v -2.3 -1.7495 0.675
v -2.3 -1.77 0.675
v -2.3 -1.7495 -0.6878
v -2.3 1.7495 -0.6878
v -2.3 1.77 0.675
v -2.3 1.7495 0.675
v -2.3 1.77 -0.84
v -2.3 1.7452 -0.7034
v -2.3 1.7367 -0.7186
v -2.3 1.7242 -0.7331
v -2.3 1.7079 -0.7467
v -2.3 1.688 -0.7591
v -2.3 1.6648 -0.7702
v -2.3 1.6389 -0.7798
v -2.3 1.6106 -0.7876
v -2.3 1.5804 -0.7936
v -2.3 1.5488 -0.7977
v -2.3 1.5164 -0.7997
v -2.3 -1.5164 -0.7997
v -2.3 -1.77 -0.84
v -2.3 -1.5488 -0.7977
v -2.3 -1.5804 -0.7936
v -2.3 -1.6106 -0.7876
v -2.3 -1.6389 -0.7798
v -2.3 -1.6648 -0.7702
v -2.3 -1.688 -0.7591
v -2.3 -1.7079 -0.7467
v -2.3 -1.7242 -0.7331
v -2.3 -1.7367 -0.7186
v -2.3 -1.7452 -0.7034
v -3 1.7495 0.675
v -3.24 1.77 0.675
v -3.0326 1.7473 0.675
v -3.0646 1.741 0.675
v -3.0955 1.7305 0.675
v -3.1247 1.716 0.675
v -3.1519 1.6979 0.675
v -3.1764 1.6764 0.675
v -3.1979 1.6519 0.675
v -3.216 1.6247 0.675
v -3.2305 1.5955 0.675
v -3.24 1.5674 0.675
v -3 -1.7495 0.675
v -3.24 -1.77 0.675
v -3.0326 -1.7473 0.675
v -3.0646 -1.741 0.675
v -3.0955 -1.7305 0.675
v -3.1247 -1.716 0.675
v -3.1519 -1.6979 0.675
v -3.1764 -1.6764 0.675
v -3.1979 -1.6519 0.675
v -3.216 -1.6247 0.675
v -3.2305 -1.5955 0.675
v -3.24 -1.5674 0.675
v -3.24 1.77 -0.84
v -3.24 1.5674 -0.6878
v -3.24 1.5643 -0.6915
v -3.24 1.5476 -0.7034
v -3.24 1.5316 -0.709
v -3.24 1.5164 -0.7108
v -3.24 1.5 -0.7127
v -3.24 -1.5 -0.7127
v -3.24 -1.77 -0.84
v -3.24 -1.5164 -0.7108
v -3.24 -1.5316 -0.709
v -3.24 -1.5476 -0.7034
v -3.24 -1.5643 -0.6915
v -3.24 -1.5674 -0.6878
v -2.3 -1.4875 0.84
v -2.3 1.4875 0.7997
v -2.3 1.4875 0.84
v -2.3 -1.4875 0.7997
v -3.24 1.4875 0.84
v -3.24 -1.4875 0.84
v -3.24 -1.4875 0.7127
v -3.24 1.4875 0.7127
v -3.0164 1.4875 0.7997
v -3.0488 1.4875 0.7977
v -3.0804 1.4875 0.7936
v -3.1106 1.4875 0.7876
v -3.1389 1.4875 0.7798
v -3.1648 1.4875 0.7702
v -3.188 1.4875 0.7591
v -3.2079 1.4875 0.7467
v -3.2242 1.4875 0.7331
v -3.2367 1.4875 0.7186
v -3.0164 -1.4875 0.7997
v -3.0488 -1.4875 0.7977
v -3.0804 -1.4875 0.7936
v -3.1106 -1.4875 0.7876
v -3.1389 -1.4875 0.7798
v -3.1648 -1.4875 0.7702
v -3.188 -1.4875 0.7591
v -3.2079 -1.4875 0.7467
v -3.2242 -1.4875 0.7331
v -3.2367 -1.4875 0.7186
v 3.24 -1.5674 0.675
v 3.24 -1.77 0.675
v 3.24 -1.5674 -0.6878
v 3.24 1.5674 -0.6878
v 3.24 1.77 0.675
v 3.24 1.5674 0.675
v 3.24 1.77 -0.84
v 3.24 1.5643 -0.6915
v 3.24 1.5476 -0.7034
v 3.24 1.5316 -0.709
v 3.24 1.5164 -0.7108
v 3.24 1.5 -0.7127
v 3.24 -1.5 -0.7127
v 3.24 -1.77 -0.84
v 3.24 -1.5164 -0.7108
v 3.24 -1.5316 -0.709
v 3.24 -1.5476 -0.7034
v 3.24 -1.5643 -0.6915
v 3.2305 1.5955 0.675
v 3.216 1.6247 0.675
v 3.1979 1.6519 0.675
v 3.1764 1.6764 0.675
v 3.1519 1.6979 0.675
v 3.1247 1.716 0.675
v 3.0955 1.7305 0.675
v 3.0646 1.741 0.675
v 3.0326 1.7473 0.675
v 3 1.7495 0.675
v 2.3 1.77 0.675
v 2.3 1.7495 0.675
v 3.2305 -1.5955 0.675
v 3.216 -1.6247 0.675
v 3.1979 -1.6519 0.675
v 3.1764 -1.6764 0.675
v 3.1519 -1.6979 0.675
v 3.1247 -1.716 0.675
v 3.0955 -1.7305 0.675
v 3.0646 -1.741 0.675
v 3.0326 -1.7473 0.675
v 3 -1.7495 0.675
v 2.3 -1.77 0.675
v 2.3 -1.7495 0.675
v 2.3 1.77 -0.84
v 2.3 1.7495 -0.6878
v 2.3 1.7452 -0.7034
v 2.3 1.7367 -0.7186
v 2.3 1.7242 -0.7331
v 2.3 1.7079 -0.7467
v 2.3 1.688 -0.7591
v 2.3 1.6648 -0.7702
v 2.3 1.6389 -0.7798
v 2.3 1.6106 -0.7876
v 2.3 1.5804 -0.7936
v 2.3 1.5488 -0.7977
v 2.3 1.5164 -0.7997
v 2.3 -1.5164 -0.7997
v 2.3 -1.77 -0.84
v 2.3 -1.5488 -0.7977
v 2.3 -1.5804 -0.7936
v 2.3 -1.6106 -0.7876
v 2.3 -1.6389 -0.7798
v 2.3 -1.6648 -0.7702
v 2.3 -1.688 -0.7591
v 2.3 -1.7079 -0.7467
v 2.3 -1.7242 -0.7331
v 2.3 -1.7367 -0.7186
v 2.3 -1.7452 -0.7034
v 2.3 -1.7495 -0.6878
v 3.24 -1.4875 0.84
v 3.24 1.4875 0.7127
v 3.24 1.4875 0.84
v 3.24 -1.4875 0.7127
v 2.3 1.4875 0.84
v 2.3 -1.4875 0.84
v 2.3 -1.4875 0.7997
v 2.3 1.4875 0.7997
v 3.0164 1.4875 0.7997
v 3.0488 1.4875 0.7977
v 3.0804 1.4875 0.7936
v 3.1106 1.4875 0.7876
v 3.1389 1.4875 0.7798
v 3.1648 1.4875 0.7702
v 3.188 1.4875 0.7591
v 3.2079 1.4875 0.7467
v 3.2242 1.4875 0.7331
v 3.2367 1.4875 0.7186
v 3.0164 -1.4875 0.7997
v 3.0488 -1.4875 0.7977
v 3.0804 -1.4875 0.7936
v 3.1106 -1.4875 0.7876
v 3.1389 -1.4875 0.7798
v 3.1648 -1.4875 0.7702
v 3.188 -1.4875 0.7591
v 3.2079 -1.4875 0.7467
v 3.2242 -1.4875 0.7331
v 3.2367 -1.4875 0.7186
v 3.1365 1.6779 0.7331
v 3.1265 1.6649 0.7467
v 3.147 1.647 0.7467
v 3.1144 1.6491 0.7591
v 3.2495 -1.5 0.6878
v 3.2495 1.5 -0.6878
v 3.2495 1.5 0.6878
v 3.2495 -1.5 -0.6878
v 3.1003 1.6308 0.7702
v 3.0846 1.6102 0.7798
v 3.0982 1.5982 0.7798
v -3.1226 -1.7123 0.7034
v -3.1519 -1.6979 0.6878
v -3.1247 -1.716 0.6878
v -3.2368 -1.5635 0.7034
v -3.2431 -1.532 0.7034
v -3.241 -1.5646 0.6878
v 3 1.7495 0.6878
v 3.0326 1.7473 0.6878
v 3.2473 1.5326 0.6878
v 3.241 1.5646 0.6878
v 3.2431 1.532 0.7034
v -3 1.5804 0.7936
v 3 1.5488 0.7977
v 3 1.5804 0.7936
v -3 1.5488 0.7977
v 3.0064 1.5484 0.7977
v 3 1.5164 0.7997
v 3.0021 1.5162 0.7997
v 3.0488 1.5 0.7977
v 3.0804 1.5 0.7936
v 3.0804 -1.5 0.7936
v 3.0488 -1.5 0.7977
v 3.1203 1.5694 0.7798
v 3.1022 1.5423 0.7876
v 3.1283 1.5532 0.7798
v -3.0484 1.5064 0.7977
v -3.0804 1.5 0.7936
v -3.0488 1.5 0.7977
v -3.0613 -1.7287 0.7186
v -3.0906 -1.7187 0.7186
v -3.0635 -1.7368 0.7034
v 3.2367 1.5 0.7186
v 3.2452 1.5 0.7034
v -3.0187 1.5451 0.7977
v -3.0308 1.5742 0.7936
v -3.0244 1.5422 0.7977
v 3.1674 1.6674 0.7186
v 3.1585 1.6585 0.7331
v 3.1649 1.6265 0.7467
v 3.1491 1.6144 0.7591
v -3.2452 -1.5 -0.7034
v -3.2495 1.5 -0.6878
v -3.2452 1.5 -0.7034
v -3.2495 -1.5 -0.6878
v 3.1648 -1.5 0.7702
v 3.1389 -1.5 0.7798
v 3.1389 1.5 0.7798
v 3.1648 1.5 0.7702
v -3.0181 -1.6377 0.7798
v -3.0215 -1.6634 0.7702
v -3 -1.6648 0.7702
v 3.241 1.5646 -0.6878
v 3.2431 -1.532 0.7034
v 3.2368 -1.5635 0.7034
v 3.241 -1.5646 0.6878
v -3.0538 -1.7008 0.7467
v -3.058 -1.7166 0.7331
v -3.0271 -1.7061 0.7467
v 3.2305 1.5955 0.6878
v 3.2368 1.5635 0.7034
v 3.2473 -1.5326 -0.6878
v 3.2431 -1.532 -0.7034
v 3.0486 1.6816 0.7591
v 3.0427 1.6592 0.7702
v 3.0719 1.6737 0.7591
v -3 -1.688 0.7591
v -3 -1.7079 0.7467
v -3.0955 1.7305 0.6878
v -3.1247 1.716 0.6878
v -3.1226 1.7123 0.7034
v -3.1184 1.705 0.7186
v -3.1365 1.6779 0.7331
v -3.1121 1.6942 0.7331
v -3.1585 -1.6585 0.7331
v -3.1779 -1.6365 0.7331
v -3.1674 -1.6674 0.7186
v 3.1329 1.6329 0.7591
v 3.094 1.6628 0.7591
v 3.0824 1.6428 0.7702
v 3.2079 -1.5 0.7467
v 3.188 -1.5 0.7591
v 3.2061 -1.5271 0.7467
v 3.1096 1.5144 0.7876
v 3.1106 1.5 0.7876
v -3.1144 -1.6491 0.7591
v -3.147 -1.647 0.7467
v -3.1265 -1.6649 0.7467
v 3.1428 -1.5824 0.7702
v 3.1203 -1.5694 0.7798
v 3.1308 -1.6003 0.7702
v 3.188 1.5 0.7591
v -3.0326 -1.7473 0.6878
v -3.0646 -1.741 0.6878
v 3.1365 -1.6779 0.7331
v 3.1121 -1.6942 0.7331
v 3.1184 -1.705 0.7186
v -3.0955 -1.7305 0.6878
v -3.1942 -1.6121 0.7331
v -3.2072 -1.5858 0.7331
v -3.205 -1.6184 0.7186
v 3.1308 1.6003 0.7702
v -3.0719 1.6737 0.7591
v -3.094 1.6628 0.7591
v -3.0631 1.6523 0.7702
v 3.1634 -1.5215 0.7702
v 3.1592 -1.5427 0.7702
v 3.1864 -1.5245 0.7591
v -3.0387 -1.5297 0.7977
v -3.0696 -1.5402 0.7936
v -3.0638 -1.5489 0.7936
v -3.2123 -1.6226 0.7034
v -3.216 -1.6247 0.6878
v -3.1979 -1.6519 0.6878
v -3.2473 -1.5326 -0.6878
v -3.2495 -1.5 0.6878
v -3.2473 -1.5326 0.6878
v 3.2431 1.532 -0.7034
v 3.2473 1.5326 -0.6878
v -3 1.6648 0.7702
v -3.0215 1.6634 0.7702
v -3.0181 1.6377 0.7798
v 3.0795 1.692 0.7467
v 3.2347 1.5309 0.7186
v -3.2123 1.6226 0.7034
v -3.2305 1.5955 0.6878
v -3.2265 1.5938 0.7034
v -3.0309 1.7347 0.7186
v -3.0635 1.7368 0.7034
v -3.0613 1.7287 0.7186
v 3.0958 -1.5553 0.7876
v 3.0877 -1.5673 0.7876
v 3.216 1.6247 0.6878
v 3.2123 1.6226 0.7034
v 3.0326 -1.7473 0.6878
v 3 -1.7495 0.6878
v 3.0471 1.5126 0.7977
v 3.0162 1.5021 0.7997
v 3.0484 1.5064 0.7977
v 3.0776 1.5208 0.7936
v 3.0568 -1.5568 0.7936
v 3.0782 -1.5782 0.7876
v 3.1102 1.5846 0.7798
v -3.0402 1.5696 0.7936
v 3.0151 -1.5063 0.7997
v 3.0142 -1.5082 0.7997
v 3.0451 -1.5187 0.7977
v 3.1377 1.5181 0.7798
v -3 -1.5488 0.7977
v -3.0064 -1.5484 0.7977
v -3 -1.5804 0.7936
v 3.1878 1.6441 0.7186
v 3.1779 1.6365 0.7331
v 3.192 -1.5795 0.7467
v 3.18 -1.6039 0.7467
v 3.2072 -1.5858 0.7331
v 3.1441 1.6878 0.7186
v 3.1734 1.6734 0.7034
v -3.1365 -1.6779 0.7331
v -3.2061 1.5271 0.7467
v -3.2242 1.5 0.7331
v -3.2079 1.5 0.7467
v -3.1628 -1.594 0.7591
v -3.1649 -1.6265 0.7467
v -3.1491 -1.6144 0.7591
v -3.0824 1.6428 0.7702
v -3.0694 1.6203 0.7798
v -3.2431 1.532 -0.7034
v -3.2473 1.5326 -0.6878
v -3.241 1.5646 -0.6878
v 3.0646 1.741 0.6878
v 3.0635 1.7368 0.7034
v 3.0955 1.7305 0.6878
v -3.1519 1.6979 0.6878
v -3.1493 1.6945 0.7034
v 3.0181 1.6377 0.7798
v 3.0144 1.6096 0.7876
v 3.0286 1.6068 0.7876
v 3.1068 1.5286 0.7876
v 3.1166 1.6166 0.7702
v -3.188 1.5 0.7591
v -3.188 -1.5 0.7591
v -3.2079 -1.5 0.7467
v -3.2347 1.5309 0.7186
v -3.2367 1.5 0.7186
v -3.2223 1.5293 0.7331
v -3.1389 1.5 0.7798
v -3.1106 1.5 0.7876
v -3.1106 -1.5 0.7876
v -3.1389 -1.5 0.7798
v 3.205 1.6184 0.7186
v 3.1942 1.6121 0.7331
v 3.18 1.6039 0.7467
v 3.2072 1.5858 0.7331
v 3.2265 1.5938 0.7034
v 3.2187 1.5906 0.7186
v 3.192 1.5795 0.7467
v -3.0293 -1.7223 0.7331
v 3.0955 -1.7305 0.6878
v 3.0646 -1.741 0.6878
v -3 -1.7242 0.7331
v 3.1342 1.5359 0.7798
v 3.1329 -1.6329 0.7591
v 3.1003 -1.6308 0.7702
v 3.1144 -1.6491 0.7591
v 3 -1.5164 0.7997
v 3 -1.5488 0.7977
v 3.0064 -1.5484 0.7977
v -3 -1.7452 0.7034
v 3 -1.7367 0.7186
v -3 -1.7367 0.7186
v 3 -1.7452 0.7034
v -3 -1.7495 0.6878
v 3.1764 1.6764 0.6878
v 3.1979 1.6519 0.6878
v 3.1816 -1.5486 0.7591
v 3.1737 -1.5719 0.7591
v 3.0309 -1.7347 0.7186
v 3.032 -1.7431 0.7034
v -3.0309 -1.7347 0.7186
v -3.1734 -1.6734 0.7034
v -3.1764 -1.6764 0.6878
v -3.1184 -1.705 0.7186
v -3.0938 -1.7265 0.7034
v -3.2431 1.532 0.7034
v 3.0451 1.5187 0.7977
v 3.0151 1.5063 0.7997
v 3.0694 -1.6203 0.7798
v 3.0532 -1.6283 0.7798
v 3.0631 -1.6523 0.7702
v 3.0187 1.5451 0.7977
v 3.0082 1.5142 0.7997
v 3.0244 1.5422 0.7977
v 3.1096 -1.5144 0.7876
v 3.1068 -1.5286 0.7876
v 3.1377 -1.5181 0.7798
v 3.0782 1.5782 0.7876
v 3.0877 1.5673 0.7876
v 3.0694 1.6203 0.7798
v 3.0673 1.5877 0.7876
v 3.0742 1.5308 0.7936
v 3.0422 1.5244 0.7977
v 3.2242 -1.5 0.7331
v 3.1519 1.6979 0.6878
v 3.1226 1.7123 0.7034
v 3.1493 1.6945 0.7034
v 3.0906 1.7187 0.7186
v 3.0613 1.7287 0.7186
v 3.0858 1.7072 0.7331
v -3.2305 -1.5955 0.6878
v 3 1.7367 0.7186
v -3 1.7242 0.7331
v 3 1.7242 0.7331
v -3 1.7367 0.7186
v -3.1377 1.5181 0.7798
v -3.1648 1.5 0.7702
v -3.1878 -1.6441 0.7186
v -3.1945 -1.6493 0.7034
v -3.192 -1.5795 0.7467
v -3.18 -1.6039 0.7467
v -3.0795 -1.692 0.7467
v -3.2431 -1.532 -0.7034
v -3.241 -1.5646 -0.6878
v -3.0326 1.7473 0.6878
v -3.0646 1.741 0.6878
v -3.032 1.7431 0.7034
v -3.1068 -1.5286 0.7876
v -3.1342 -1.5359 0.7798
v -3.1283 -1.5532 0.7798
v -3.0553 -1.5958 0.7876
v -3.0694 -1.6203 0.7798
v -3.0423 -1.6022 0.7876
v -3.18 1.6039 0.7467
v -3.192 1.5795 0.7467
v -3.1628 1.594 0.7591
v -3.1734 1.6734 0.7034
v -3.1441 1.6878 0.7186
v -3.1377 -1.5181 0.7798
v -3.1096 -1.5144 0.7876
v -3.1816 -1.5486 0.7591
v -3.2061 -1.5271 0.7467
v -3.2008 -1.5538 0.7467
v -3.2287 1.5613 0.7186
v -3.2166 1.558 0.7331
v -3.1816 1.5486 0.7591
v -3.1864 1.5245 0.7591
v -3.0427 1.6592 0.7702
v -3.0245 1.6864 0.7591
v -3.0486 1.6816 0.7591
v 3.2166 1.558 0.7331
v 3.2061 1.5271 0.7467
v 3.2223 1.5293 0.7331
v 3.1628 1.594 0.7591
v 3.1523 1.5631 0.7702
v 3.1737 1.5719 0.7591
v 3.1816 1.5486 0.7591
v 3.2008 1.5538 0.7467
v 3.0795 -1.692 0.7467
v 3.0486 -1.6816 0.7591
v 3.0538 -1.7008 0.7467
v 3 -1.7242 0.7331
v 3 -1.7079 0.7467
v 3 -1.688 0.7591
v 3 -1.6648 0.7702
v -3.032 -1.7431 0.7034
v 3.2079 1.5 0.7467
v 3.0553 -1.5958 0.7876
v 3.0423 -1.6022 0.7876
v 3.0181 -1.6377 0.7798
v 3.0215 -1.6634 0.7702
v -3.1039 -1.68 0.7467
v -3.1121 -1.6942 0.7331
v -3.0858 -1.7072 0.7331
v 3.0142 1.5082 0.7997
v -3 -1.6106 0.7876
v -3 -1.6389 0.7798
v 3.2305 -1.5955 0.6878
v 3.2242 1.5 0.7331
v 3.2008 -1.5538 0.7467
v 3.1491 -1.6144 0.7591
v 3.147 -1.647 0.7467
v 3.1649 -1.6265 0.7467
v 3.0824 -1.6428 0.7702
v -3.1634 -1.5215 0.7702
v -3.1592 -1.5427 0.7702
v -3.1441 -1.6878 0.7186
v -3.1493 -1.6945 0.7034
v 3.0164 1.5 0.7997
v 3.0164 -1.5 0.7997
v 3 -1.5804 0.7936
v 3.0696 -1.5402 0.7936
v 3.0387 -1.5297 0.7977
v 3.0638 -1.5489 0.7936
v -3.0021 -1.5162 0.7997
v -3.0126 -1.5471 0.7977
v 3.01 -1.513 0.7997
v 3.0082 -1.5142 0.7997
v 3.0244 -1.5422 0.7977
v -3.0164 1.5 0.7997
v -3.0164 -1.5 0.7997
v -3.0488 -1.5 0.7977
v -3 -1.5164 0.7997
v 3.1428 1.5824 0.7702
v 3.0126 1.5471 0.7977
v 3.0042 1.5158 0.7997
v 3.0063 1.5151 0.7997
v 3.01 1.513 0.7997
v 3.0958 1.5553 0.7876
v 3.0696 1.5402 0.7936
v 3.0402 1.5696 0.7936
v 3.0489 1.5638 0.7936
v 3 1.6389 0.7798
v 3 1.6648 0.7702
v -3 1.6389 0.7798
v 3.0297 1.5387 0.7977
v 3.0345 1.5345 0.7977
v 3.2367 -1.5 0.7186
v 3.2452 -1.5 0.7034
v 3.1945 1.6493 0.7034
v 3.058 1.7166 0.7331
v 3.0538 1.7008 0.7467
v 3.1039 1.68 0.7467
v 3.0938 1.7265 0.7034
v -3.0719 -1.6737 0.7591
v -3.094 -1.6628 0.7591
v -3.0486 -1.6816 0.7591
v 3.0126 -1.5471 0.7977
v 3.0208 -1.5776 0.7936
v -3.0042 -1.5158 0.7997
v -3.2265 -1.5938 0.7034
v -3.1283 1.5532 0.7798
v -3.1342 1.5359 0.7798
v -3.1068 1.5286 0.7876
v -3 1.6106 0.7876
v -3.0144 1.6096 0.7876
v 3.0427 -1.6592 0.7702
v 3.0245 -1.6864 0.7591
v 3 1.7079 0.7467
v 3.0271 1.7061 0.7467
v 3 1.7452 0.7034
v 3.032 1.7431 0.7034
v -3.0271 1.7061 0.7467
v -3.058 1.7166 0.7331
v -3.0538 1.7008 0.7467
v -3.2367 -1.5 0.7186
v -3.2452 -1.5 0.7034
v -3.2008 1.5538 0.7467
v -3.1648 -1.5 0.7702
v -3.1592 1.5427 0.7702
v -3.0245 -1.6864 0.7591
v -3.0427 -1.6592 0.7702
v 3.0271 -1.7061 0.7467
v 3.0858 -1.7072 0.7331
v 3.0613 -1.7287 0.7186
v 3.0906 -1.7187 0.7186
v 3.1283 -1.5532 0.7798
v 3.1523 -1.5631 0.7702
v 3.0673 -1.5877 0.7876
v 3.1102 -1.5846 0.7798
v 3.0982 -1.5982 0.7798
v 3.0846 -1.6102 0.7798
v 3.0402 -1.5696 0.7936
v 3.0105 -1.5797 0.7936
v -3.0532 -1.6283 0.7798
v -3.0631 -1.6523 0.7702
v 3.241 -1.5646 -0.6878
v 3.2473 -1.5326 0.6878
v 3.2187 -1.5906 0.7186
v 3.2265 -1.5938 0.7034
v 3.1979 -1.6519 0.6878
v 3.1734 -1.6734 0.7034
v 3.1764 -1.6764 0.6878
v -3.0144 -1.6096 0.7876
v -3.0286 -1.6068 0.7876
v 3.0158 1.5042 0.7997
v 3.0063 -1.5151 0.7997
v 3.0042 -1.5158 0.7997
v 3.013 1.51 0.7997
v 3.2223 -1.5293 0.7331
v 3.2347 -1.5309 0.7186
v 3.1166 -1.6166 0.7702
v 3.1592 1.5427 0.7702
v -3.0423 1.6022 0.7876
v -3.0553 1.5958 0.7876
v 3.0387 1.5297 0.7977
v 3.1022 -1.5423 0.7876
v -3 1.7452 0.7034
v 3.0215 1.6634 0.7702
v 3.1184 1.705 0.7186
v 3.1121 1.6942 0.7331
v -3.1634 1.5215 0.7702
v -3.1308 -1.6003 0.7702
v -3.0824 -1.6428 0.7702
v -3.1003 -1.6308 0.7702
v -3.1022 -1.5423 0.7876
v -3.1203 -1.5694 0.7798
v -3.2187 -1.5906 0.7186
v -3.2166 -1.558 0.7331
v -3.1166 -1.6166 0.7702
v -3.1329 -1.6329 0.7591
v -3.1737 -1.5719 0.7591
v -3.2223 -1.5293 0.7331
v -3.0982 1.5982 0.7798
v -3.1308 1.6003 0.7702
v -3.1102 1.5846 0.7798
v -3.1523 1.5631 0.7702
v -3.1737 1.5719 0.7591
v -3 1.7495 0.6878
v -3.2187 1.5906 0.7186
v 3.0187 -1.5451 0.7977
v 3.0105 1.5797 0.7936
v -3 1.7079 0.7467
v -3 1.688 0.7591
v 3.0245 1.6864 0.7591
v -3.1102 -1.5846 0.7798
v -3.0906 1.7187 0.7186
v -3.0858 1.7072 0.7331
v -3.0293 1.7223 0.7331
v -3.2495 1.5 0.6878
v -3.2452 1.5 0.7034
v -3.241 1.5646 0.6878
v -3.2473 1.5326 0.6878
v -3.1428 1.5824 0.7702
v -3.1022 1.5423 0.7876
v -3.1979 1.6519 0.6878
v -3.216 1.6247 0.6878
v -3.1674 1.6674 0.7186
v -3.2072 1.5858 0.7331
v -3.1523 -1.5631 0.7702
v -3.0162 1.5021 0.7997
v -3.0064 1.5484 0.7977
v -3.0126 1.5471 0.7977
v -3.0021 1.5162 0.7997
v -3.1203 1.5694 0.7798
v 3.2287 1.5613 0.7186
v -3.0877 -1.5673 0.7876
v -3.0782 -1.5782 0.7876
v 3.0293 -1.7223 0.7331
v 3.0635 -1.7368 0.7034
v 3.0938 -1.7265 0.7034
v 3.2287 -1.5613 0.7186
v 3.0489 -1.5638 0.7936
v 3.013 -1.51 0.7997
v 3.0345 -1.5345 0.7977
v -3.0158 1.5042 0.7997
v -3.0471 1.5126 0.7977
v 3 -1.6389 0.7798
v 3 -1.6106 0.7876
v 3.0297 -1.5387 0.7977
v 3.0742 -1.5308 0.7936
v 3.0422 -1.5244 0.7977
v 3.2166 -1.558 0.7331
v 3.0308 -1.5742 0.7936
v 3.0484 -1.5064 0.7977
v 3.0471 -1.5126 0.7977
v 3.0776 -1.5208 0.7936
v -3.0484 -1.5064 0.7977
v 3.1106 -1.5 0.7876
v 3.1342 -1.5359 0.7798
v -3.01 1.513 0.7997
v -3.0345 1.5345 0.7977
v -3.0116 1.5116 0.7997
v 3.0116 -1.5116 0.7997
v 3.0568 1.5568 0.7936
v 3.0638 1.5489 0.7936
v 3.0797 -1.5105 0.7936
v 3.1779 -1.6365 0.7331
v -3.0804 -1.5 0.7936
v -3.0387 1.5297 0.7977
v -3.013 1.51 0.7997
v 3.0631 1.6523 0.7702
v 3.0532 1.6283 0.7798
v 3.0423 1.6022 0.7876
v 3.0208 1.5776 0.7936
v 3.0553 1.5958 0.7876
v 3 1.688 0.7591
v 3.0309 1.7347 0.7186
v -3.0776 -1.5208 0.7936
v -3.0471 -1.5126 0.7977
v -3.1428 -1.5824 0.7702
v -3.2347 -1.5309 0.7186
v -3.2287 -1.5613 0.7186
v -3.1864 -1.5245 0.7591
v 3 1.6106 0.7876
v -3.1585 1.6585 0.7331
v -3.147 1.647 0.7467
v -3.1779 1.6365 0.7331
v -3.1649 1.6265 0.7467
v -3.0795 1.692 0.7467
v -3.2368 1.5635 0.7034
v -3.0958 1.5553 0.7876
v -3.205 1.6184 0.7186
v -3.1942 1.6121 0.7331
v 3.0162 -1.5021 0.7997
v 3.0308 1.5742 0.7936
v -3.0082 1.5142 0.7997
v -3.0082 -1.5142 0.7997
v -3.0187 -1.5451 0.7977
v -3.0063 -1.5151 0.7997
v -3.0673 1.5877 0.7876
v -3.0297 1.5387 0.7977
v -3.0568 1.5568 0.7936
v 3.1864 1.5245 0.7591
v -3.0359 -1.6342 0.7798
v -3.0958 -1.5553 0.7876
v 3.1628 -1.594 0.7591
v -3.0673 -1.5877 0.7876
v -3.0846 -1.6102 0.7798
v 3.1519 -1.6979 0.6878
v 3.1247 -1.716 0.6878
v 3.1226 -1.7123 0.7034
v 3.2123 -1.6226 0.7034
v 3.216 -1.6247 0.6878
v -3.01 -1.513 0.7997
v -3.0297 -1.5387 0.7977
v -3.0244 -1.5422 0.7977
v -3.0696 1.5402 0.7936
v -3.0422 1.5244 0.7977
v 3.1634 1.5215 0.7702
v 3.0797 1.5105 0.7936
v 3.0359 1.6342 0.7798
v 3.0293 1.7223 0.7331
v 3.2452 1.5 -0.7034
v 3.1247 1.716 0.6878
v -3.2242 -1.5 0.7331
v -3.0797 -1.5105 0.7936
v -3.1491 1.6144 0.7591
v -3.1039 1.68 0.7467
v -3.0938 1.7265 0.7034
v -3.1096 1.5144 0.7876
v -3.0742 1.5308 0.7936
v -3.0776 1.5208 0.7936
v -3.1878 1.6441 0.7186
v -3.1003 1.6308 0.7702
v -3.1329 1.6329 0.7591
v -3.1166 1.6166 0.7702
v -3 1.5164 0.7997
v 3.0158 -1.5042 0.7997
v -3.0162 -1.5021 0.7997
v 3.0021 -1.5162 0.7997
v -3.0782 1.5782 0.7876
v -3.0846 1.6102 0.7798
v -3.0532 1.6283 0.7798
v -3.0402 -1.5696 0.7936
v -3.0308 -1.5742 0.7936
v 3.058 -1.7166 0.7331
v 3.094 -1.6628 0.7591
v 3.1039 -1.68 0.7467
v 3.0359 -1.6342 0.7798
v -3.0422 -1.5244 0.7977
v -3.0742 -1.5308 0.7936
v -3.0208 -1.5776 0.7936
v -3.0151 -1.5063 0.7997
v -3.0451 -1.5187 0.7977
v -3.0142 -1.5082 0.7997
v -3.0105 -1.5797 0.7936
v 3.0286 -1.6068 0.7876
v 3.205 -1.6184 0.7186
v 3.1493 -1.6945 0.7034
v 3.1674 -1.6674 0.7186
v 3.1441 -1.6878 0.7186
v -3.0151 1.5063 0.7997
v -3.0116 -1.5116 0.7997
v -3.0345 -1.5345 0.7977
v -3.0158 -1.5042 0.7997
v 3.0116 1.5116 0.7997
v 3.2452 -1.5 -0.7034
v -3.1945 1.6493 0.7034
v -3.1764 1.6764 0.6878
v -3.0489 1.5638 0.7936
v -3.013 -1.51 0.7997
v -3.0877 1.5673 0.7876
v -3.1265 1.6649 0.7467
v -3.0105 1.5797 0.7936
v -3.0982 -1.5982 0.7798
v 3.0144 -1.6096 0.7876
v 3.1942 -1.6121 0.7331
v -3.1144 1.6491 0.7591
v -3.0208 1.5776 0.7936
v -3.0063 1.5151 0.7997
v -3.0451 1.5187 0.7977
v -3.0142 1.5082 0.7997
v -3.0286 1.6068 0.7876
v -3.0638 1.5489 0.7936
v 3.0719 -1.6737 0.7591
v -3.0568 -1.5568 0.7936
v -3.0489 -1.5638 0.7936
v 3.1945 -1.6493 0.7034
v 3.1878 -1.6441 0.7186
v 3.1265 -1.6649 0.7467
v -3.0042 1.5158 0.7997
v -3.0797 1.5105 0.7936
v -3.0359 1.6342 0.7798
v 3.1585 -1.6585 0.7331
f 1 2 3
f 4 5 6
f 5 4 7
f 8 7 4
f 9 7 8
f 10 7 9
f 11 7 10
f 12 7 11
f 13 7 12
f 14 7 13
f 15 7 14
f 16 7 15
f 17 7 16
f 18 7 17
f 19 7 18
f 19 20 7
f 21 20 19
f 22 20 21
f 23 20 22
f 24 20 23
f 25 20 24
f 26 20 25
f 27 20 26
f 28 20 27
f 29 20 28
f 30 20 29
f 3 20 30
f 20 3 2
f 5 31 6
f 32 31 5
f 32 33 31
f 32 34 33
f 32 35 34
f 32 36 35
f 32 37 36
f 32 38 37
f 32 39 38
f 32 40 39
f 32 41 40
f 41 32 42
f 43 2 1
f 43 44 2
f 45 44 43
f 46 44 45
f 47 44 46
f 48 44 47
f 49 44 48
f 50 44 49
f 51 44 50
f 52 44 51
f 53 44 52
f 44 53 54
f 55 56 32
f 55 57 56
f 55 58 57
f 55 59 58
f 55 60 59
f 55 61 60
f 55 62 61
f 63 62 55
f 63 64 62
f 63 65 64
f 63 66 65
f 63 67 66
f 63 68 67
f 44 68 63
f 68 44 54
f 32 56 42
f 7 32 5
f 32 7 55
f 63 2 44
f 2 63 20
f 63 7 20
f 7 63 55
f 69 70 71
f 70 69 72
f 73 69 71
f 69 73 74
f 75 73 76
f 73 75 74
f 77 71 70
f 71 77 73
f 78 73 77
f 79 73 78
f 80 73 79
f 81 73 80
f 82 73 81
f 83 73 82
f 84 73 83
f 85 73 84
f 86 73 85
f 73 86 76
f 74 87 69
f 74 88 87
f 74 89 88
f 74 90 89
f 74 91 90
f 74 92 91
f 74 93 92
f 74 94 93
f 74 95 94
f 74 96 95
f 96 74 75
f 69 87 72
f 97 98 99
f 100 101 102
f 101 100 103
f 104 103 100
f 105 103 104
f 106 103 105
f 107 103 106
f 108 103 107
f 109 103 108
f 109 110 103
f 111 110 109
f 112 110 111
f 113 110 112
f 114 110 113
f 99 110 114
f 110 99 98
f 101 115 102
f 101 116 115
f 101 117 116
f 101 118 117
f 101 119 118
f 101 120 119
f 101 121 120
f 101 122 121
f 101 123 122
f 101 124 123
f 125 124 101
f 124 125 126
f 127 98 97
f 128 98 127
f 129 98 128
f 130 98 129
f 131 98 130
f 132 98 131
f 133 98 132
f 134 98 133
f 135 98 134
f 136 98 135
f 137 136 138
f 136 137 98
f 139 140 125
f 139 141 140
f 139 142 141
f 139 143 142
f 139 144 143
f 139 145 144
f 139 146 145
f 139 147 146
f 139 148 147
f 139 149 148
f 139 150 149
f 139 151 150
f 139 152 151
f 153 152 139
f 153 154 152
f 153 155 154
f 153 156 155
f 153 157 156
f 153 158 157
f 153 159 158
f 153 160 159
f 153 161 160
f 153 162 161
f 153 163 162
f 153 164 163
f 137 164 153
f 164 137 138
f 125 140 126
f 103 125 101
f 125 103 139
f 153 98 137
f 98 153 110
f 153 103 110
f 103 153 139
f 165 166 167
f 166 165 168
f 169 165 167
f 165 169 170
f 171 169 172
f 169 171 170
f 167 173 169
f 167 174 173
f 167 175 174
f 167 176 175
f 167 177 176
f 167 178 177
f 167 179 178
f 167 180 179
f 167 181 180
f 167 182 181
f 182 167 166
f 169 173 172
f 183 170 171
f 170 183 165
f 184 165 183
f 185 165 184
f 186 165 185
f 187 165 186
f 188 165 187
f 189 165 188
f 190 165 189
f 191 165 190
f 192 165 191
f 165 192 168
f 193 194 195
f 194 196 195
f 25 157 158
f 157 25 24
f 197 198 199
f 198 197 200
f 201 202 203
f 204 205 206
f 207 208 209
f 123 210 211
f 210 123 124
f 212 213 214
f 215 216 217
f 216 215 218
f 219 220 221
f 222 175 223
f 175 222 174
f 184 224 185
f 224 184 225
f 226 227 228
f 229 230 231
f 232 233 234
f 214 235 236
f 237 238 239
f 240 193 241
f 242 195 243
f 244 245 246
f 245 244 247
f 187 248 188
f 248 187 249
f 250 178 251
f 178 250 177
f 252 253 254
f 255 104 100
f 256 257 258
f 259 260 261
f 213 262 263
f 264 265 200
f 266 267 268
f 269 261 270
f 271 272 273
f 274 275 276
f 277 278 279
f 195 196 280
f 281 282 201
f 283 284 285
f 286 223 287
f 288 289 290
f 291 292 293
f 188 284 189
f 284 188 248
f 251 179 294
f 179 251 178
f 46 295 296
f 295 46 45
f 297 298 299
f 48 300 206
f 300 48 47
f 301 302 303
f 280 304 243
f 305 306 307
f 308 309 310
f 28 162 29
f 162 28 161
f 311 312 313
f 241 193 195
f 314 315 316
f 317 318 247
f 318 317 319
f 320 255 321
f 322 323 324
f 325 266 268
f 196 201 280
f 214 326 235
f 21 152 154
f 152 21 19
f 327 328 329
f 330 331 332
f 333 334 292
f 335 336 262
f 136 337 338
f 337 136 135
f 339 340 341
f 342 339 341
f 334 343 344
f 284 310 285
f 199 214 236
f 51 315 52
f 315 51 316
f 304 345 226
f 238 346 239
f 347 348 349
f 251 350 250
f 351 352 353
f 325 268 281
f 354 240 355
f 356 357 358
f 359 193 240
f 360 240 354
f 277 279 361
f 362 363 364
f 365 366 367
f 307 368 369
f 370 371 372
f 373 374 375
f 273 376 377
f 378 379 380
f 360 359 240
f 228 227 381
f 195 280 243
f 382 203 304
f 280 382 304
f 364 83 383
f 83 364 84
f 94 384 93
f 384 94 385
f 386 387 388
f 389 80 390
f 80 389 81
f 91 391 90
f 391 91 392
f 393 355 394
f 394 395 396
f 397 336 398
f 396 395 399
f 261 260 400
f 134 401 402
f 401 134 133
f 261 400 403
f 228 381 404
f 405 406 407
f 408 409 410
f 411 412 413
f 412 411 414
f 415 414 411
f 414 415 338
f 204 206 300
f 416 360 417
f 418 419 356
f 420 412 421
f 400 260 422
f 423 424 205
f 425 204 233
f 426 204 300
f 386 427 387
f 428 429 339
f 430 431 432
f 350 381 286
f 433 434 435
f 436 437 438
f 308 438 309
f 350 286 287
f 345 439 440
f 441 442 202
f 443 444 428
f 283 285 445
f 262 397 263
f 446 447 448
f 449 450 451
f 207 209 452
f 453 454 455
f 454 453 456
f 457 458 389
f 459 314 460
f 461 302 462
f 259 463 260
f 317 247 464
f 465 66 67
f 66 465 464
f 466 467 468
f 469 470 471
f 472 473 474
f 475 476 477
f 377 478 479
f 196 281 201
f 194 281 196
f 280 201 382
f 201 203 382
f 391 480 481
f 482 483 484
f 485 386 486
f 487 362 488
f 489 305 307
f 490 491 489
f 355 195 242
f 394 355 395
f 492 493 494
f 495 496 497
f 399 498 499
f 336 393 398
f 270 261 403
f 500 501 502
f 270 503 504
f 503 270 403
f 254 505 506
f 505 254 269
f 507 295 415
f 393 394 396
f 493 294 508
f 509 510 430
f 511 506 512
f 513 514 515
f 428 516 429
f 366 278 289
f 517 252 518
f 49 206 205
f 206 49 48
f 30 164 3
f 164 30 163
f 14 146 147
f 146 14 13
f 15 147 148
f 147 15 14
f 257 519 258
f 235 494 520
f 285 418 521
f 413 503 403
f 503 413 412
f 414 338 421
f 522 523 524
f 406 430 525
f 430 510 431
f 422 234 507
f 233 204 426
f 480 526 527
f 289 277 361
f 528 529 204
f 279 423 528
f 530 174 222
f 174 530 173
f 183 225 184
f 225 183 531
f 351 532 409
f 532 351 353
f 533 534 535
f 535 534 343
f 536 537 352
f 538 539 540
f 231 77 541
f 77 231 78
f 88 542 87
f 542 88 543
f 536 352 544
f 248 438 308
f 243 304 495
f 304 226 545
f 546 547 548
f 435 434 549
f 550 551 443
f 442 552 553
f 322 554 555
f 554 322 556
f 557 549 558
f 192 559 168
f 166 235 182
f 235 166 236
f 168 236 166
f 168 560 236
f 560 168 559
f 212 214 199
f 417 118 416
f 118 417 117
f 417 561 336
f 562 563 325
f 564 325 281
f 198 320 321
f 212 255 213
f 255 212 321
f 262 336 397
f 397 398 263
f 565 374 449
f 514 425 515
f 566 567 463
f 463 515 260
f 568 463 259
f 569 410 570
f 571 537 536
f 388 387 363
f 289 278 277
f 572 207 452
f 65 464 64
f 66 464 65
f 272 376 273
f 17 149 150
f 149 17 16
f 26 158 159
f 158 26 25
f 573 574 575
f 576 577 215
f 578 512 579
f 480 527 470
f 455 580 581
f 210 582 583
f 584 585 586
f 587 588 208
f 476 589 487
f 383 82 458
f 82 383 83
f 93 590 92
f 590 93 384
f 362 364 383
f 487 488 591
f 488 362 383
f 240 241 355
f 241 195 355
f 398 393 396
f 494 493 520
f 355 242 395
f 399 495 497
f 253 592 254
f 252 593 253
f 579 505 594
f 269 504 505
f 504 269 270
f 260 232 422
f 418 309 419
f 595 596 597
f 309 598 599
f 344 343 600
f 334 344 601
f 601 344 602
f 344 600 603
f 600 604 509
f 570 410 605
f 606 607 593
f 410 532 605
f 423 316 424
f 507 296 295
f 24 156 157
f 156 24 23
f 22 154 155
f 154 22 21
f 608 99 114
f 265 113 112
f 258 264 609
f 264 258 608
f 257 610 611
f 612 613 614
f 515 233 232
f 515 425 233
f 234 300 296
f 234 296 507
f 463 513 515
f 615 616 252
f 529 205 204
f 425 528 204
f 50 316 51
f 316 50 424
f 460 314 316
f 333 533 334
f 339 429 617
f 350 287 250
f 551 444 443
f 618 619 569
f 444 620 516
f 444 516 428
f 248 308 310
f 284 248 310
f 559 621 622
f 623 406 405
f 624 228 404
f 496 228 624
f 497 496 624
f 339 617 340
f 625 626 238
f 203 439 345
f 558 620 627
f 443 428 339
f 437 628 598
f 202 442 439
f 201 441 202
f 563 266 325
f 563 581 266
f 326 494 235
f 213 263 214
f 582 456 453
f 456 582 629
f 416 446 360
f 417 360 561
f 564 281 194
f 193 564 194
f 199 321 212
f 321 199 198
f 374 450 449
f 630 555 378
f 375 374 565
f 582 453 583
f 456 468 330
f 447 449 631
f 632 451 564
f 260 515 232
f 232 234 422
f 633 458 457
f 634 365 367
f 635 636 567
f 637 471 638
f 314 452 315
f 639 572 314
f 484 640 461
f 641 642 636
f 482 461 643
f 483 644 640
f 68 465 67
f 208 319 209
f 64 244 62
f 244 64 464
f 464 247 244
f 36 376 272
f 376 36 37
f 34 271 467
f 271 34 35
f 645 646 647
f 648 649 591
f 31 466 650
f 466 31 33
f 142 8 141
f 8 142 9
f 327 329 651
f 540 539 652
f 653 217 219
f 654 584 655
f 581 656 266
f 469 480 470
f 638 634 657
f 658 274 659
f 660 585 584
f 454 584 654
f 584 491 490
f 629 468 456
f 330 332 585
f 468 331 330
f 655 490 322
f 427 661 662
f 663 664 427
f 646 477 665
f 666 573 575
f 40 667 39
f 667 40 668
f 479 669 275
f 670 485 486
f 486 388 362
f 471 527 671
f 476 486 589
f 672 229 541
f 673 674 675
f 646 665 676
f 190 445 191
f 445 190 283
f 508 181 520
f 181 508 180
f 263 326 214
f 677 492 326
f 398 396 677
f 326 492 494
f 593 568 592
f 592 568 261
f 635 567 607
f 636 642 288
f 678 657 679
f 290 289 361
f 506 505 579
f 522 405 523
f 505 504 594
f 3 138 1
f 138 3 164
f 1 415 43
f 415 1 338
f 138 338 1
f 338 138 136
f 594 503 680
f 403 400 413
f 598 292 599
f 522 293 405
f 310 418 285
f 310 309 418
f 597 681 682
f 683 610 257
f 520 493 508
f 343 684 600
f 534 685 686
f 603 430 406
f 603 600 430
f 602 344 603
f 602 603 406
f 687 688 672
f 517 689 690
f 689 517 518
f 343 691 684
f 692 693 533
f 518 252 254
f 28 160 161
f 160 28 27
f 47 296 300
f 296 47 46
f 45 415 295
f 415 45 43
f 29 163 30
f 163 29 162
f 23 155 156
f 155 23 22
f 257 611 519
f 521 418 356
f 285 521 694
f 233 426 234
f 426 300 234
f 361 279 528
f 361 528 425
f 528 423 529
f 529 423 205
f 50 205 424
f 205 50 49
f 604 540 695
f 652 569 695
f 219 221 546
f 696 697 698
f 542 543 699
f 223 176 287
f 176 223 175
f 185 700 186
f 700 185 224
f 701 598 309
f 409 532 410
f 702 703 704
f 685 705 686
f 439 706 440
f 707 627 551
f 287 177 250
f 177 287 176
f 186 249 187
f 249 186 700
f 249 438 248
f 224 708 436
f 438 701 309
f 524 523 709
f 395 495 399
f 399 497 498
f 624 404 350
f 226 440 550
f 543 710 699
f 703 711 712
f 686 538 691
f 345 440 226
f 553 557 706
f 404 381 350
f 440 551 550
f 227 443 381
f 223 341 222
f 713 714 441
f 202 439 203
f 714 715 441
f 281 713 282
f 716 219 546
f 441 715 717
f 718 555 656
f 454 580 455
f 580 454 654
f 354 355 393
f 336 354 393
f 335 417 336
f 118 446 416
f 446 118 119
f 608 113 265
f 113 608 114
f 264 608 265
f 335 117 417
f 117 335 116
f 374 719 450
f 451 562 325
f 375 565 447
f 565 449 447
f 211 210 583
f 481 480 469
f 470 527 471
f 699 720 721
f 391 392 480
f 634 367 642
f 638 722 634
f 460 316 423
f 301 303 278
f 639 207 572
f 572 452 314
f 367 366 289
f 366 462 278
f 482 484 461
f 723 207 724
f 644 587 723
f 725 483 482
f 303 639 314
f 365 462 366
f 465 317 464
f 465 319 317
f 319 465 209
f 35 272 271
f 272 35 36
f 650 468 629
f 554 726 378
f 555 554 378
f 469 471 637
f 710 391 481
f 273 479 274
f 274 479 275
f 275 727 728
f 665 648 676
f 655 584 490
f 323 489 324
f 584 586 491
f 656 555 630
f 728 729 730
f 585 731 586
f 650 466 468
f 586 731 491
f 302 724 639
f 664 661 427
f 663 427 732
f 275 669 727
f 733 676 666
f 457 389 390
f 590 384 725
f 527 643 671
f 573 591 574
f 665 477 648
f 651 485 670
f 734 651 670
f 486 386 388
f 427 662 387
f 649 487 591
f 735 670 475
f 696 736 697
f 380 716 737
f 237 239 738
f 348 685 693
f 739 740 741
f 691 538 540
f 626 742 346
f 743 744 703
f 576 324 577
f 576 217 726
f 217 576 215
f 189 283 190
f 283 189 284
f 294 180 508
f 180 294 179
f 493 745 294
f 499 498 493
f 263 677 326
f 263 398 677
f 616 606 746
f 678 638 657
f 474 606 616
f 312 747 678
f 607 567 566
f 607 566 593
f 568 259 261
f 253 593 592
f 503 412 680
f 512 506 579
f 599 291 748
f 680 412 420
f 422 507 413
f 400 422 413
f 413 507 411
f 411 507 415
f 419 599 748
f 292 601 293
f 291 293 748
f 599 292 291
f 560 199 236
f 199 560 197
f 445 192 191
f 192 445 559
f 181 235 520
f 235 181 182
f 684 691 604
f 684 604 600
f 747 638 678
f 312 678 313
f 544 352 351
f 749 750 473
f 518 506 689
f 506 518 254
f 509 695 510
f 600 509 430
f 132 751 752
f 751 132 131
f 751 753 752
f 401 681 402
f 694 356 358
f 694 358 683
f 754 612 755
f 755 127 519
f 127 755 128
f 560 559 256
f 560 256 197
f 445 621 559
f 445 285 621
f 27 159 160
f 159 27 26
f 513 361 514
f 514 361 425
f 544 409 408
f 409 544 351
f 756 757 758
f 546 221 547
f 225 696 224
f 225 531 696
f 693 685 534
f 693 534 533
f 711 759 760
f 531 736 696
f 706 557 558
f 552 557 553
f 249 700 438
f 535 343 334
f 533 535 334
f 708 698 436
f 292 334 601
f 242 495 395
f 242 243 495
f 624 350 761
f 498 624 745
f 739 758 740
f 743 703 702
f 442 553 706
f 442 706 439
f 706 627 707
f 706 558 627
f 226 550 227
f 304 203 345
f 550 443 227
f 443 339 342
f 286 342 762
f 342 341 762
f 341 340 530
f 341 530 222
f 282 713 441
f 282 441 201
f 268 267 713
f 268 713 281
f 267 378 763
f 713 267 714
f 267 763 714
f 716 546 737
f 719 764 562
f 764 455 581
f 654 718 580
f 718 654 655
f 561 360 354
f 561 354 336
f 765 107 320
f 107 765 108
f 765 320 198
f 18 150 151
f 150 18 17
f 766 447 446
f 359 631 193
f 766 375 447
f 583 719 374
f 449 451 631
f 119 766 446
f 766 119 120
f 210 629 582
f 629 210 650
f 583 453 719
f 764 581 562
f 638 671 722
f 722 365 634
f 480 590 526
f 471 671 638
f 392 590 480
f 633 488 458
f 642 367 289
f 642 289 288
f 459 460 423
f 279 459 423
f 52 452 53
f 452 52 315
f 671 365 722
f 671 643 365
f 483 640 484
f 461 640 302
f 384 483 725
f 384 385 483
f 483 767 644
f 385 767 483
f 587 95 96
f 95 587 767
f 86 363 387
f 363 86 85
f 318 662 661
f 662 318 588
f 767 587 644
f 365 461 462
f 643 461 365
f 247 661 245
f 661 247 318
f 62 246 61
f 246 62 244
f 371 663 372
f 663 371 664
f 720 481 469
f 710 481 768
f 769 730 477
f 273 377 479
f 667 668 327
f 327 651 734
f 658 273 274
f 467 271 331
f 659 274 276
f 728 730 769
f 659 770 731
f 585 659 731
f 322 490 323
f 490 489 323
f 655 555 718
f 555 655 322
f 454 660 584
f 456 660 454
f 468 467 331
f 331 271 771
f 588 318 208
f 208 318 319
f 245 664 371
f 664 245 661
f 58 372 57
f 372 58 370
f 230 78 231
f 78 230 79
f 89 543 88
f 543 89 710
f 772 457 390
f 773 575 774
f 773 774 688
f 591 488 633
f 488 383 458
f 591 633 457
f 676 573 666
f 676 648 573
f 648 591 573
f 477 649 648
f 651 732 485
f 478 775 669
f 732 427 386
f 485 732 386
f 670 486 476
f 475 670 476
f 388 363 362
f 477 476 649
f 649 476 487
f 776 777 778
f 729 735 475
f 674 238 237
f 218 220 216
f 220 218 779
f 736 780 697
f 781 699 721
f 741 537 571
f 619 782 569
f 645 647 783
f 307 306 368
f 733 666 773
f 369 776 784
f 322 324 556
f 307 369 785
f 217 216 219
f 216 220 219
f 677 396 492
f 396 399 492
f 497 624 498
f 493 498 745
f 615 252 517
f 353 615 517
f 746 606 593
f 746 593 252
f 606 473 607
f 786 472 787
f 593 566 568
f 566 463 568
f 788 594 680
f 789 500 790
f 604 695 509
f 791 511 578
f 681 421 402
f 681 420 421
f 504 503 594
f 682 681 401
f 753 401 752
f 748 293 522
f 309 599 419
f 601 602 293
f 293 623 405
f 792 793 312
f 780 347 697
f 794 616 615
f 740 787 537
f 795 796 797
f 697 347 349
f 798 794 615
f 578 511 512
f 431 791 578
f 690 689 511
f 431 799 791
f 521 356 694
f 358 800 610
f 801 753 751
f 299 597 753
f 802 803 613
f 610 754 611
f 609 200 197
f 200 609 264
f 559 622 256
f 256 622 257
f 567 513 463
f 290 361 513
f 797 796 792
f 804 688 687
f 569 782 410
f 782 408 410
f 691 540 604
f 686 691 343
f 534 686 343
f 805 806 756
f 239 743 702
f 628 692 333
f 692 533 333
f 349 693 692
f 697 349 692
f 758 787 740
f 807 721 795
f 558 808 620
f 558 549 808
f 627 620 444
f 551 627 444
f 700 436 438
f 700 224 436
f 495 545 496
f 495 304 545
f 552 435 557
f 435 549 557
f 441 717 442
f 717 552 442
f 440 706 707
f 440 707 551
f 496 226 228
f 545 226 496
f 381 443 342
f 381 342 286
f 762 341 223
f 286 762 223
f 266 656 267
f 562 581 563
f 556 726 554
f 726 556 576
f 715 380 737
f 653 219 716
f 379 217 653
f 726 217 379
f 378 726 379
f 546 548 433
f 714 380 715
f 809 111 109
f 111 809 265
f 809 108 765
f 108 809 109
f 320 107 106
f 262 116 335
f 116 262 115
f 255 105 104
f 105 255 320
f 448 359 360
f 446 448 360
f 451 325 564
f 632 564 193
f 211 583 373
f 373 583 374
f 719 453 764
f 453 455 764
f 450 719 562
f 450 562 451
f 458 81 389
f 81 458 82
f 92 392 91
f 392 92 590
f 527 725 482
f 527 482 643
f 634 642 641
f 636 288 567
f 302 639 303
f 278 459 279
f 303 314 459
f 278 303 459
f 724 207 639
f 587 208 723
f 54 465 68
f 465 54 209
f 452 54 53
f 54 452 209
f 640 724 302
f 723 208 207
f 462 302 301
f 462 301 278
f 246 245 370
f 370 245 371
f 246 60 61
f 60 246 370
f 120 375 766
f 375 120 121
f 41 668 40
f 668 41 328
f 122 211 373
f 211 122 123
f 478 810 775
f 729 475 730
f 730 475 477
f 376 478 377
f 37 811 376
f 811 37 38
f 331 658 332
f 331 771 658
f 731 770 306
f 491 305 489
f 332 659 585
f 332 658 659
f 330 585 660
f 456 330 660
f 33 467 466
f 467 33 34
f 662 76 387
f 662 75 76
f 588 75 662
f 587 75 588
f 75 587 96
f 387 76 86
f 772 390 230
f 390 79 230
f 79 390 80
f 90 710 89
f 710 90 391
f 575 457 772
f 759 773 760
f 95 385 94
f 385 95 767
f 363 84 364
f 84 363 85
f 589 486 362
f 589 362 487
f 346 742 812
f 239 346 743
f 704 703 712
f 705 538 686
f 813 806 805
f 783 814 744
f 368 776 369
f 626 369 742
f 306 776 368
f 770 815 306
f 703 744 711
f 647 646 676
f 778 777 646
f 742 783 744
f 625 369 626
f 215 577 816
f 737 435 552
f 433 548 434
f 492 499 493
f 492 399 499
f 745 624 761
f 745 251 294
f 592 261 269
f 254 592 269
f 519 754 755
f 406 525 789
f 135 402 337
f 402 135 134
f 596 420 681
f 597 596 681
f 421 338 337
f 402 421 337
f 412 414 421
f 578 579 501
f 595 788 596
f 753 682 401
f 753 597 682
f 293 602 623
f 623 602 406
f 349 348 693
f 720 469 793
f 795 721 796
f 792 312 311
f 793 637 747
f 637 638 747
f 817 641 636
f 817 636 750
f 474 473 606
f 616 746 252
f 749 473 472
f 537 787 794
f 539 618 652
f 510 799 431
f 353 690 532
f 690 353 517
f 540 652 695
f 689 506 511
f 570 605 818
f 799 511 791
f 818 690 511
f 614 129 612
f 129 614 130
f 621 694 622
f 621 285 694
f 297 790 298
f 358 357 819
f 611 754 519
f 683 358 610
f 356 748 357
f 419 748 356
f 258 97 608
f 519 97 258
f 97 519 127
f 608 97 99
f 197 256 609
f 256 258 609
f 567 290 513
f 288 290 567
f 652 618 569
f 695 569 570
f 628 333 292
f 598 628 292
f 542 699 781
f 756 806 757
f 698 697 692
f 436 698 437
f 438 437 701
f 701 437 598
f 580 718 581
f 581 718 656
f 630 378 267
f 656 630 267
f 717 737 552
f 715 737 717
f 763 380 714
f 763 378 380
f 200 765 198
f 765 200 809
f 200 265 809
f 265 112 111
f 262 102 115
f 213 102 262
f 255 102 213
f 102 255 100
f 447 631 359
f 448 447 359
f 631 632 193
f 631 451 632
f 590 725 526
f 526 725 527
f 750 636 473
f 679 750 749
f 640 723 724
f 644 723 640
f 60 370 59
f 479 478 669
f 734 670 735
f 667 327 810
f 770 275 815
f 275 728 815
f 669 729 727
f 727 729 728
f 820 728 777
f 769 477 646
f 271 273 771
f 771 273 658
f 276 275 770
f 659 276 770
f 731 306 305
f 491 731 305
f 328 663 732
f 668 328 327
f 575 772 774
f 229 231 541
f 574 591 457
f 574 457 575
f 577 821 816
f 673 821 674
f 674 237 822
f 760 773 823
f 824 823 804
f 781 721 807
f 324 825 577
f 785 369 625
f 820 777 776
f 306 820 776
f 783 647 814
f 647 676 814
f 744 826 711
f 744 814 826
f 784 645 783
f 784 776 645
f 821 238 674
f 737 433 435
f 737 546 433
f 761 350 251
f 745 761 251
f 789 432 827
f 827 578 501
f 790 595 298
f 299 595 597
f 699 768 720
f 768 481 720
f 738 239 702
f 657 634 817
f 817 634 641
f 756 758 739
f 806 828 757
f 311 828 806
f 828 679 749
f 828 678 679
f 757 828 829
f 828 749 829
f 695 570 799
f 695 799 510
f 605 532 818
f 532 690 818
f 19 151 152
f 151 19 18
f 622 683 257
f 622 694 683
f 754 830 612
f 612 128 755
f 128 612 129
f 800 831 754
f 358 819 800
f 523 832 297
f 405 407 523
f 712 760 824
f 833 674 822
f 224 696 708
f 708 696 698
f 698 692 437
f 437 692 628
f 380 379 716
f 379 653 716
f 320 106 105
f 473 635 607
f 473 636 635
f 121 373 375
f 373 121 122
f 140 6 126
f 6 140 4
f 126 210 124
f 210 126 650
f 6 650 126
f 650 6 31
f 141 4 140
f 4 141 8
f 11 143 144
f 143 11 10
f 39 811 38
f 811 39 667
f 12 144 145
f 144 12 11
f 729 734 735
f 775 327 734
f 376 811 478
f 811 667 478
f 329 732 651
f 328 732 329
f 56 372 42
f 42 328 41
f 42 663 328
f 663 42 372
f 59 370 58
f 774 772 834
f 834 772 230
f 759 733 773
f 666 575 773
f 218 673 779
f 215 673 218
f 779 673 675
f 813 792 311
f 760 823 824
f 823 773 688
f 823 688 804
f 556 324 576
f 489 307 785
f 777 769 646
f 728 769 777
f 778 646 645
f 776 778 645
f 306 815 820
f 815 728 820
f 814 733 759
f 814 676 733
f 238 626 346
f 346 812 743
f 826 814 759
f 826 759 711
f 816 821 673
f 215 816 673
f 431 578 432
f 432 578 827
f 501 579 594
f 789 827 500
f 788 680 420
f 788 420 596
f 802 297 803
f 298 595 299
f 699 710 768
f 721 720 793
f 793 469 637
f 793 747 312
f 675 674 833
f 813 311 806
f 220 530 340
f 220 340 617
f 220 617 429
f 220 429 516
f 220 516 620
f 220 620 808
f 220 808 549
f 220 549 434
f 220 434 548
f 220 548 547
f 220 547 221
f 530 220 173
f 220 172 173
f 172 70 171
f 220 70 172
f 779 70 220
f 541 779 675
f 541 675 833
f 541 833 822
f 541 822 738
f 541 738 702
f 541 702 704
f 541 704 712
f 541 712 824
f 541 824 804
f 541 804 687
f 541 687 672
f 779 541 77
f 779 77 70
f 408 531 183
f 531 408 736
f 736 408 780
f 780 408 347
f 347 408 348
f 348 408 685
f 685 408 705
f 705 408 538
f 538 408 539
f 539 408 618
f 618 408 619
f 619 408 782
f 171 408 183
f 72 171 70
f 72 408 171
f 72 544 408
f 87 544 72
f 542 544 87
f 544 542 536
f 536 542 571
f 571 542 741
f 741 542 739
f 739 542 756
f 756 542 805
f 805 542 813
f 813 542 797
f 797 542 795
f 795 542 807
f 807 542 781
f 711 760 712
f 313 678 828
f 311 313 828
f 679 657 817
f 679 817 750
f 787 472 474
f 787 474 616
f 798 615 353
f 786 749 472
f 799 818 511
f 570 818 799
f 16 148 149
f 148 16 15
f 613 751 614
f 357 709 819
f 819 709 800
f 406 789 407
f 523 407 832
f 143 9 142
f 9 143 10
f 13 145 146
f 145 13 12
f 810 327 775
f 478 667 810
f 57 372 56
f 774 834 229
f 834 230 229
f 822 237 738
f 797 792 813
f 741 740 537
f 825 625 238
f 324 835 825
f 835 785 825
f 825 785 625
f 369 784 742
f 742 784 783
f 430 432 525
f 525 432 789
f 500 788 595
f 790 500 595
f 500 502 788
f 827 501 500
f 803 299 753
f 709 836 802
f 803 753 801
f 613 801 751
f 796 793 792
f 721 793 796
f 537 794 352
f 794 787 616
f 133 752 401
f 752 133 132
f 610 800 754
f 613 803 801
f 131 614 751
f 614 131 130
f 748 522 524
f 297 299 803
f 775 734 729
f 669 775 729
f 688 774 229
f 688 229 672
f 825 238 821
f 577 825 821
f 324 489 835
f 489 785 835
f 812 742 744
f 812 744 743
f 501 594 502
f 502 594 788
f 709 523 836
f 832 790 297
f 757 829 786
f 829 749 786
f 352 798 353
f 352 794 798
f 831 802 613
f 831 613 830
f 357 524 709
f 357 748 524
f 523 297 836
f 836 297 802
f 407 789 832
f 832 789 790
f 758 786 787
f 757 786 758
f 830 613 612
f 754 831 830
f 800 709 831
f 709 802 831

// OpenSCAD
// SMD package target size: [6.5, 3.5, 1.6] (L, W, H)
// One connected solid with recognizable side terminations.

$fn = 48;

// Overall dimensions
L = 6.5;
W = 3.5;
H = 1.6;

// Termination (metal end caps) - kept within overall L
term_len = 0.9;          // length of each end termination along L
term_inset = 0.05;       // small inset from the very end
term_drop = 0.25;        // how much termination wraps down the sides
term_top = 0.10;         // slight wrap onto top

// Body shaping
edge_r = 0.25;           // corner rounding radius (XY)
top_r  = 0.12;           // top edge rounding (Z)
overlap = 0.02;          // ensures unions overlap (watertight)

// Rounded box helper (rounded in XY, with slight Z rounding via minkowski)
module rounded_body(l, w, h, r_xy, r_z) {
    // Keep radii valid
    rxy = min(r_xy, min(l, w)/2 - 0.001);
    rz  = min(r_z, h/2 - 0.001);

    minkowski() {
        // Core box reduced by rounding amounts
        cube([l - 2*rxy, w - 2*rxy, h - 2*rz], center=true);
        // Rounded edges: cylinder gives XY rounding; sphere gives Z rounding
        // Use sphere for uniform rounding; small rz keeps it subtle.
        scale([1,1,rz/rxy])
            sphere(r=rxy);
    }
}

// Main SMD model
module smd_6p5x3p5x1p6() {
    union() {
        // Ceramic/plastic body
        rounded_body(L, W, H, edge_r, top_r);

        // End terminations (wrap down sides and slightly onto top)
        for (sx = [-1, 1]) {
            // Place termination centered near each end, fully within overall length.
            // Center position computed from dimensions (no arbitrary offsets).
            translate([sx * (L/2 - term_inset - term_len/2 + overlap), 0, 0])
                union() {
                    // Side wrap (covers full height, slightly thicker to ensure overlap)
                    cube([term_len + 2*overlap, W + 2*overlap, H - term_drop], center=true);

                    // Bottom wrap (a bit thicker at bottom to look like plated end)
                    translate([0, 0, -(H/2) + (term_drop/2) - overlap])
                        cube([term_len + 2*overlap, W + 2*overlap, term_drop + 2*overlap], center=true);

                    // Small top wrap
                    translate([0, 0, (H/2) - (term_top/2) + overlap])
                        cube([term_len + 2*overlap, W*0.85, term_top + 2*overlap], center=true);
                }
        }
    }
}

smd_6p5x3p5x1p6();
